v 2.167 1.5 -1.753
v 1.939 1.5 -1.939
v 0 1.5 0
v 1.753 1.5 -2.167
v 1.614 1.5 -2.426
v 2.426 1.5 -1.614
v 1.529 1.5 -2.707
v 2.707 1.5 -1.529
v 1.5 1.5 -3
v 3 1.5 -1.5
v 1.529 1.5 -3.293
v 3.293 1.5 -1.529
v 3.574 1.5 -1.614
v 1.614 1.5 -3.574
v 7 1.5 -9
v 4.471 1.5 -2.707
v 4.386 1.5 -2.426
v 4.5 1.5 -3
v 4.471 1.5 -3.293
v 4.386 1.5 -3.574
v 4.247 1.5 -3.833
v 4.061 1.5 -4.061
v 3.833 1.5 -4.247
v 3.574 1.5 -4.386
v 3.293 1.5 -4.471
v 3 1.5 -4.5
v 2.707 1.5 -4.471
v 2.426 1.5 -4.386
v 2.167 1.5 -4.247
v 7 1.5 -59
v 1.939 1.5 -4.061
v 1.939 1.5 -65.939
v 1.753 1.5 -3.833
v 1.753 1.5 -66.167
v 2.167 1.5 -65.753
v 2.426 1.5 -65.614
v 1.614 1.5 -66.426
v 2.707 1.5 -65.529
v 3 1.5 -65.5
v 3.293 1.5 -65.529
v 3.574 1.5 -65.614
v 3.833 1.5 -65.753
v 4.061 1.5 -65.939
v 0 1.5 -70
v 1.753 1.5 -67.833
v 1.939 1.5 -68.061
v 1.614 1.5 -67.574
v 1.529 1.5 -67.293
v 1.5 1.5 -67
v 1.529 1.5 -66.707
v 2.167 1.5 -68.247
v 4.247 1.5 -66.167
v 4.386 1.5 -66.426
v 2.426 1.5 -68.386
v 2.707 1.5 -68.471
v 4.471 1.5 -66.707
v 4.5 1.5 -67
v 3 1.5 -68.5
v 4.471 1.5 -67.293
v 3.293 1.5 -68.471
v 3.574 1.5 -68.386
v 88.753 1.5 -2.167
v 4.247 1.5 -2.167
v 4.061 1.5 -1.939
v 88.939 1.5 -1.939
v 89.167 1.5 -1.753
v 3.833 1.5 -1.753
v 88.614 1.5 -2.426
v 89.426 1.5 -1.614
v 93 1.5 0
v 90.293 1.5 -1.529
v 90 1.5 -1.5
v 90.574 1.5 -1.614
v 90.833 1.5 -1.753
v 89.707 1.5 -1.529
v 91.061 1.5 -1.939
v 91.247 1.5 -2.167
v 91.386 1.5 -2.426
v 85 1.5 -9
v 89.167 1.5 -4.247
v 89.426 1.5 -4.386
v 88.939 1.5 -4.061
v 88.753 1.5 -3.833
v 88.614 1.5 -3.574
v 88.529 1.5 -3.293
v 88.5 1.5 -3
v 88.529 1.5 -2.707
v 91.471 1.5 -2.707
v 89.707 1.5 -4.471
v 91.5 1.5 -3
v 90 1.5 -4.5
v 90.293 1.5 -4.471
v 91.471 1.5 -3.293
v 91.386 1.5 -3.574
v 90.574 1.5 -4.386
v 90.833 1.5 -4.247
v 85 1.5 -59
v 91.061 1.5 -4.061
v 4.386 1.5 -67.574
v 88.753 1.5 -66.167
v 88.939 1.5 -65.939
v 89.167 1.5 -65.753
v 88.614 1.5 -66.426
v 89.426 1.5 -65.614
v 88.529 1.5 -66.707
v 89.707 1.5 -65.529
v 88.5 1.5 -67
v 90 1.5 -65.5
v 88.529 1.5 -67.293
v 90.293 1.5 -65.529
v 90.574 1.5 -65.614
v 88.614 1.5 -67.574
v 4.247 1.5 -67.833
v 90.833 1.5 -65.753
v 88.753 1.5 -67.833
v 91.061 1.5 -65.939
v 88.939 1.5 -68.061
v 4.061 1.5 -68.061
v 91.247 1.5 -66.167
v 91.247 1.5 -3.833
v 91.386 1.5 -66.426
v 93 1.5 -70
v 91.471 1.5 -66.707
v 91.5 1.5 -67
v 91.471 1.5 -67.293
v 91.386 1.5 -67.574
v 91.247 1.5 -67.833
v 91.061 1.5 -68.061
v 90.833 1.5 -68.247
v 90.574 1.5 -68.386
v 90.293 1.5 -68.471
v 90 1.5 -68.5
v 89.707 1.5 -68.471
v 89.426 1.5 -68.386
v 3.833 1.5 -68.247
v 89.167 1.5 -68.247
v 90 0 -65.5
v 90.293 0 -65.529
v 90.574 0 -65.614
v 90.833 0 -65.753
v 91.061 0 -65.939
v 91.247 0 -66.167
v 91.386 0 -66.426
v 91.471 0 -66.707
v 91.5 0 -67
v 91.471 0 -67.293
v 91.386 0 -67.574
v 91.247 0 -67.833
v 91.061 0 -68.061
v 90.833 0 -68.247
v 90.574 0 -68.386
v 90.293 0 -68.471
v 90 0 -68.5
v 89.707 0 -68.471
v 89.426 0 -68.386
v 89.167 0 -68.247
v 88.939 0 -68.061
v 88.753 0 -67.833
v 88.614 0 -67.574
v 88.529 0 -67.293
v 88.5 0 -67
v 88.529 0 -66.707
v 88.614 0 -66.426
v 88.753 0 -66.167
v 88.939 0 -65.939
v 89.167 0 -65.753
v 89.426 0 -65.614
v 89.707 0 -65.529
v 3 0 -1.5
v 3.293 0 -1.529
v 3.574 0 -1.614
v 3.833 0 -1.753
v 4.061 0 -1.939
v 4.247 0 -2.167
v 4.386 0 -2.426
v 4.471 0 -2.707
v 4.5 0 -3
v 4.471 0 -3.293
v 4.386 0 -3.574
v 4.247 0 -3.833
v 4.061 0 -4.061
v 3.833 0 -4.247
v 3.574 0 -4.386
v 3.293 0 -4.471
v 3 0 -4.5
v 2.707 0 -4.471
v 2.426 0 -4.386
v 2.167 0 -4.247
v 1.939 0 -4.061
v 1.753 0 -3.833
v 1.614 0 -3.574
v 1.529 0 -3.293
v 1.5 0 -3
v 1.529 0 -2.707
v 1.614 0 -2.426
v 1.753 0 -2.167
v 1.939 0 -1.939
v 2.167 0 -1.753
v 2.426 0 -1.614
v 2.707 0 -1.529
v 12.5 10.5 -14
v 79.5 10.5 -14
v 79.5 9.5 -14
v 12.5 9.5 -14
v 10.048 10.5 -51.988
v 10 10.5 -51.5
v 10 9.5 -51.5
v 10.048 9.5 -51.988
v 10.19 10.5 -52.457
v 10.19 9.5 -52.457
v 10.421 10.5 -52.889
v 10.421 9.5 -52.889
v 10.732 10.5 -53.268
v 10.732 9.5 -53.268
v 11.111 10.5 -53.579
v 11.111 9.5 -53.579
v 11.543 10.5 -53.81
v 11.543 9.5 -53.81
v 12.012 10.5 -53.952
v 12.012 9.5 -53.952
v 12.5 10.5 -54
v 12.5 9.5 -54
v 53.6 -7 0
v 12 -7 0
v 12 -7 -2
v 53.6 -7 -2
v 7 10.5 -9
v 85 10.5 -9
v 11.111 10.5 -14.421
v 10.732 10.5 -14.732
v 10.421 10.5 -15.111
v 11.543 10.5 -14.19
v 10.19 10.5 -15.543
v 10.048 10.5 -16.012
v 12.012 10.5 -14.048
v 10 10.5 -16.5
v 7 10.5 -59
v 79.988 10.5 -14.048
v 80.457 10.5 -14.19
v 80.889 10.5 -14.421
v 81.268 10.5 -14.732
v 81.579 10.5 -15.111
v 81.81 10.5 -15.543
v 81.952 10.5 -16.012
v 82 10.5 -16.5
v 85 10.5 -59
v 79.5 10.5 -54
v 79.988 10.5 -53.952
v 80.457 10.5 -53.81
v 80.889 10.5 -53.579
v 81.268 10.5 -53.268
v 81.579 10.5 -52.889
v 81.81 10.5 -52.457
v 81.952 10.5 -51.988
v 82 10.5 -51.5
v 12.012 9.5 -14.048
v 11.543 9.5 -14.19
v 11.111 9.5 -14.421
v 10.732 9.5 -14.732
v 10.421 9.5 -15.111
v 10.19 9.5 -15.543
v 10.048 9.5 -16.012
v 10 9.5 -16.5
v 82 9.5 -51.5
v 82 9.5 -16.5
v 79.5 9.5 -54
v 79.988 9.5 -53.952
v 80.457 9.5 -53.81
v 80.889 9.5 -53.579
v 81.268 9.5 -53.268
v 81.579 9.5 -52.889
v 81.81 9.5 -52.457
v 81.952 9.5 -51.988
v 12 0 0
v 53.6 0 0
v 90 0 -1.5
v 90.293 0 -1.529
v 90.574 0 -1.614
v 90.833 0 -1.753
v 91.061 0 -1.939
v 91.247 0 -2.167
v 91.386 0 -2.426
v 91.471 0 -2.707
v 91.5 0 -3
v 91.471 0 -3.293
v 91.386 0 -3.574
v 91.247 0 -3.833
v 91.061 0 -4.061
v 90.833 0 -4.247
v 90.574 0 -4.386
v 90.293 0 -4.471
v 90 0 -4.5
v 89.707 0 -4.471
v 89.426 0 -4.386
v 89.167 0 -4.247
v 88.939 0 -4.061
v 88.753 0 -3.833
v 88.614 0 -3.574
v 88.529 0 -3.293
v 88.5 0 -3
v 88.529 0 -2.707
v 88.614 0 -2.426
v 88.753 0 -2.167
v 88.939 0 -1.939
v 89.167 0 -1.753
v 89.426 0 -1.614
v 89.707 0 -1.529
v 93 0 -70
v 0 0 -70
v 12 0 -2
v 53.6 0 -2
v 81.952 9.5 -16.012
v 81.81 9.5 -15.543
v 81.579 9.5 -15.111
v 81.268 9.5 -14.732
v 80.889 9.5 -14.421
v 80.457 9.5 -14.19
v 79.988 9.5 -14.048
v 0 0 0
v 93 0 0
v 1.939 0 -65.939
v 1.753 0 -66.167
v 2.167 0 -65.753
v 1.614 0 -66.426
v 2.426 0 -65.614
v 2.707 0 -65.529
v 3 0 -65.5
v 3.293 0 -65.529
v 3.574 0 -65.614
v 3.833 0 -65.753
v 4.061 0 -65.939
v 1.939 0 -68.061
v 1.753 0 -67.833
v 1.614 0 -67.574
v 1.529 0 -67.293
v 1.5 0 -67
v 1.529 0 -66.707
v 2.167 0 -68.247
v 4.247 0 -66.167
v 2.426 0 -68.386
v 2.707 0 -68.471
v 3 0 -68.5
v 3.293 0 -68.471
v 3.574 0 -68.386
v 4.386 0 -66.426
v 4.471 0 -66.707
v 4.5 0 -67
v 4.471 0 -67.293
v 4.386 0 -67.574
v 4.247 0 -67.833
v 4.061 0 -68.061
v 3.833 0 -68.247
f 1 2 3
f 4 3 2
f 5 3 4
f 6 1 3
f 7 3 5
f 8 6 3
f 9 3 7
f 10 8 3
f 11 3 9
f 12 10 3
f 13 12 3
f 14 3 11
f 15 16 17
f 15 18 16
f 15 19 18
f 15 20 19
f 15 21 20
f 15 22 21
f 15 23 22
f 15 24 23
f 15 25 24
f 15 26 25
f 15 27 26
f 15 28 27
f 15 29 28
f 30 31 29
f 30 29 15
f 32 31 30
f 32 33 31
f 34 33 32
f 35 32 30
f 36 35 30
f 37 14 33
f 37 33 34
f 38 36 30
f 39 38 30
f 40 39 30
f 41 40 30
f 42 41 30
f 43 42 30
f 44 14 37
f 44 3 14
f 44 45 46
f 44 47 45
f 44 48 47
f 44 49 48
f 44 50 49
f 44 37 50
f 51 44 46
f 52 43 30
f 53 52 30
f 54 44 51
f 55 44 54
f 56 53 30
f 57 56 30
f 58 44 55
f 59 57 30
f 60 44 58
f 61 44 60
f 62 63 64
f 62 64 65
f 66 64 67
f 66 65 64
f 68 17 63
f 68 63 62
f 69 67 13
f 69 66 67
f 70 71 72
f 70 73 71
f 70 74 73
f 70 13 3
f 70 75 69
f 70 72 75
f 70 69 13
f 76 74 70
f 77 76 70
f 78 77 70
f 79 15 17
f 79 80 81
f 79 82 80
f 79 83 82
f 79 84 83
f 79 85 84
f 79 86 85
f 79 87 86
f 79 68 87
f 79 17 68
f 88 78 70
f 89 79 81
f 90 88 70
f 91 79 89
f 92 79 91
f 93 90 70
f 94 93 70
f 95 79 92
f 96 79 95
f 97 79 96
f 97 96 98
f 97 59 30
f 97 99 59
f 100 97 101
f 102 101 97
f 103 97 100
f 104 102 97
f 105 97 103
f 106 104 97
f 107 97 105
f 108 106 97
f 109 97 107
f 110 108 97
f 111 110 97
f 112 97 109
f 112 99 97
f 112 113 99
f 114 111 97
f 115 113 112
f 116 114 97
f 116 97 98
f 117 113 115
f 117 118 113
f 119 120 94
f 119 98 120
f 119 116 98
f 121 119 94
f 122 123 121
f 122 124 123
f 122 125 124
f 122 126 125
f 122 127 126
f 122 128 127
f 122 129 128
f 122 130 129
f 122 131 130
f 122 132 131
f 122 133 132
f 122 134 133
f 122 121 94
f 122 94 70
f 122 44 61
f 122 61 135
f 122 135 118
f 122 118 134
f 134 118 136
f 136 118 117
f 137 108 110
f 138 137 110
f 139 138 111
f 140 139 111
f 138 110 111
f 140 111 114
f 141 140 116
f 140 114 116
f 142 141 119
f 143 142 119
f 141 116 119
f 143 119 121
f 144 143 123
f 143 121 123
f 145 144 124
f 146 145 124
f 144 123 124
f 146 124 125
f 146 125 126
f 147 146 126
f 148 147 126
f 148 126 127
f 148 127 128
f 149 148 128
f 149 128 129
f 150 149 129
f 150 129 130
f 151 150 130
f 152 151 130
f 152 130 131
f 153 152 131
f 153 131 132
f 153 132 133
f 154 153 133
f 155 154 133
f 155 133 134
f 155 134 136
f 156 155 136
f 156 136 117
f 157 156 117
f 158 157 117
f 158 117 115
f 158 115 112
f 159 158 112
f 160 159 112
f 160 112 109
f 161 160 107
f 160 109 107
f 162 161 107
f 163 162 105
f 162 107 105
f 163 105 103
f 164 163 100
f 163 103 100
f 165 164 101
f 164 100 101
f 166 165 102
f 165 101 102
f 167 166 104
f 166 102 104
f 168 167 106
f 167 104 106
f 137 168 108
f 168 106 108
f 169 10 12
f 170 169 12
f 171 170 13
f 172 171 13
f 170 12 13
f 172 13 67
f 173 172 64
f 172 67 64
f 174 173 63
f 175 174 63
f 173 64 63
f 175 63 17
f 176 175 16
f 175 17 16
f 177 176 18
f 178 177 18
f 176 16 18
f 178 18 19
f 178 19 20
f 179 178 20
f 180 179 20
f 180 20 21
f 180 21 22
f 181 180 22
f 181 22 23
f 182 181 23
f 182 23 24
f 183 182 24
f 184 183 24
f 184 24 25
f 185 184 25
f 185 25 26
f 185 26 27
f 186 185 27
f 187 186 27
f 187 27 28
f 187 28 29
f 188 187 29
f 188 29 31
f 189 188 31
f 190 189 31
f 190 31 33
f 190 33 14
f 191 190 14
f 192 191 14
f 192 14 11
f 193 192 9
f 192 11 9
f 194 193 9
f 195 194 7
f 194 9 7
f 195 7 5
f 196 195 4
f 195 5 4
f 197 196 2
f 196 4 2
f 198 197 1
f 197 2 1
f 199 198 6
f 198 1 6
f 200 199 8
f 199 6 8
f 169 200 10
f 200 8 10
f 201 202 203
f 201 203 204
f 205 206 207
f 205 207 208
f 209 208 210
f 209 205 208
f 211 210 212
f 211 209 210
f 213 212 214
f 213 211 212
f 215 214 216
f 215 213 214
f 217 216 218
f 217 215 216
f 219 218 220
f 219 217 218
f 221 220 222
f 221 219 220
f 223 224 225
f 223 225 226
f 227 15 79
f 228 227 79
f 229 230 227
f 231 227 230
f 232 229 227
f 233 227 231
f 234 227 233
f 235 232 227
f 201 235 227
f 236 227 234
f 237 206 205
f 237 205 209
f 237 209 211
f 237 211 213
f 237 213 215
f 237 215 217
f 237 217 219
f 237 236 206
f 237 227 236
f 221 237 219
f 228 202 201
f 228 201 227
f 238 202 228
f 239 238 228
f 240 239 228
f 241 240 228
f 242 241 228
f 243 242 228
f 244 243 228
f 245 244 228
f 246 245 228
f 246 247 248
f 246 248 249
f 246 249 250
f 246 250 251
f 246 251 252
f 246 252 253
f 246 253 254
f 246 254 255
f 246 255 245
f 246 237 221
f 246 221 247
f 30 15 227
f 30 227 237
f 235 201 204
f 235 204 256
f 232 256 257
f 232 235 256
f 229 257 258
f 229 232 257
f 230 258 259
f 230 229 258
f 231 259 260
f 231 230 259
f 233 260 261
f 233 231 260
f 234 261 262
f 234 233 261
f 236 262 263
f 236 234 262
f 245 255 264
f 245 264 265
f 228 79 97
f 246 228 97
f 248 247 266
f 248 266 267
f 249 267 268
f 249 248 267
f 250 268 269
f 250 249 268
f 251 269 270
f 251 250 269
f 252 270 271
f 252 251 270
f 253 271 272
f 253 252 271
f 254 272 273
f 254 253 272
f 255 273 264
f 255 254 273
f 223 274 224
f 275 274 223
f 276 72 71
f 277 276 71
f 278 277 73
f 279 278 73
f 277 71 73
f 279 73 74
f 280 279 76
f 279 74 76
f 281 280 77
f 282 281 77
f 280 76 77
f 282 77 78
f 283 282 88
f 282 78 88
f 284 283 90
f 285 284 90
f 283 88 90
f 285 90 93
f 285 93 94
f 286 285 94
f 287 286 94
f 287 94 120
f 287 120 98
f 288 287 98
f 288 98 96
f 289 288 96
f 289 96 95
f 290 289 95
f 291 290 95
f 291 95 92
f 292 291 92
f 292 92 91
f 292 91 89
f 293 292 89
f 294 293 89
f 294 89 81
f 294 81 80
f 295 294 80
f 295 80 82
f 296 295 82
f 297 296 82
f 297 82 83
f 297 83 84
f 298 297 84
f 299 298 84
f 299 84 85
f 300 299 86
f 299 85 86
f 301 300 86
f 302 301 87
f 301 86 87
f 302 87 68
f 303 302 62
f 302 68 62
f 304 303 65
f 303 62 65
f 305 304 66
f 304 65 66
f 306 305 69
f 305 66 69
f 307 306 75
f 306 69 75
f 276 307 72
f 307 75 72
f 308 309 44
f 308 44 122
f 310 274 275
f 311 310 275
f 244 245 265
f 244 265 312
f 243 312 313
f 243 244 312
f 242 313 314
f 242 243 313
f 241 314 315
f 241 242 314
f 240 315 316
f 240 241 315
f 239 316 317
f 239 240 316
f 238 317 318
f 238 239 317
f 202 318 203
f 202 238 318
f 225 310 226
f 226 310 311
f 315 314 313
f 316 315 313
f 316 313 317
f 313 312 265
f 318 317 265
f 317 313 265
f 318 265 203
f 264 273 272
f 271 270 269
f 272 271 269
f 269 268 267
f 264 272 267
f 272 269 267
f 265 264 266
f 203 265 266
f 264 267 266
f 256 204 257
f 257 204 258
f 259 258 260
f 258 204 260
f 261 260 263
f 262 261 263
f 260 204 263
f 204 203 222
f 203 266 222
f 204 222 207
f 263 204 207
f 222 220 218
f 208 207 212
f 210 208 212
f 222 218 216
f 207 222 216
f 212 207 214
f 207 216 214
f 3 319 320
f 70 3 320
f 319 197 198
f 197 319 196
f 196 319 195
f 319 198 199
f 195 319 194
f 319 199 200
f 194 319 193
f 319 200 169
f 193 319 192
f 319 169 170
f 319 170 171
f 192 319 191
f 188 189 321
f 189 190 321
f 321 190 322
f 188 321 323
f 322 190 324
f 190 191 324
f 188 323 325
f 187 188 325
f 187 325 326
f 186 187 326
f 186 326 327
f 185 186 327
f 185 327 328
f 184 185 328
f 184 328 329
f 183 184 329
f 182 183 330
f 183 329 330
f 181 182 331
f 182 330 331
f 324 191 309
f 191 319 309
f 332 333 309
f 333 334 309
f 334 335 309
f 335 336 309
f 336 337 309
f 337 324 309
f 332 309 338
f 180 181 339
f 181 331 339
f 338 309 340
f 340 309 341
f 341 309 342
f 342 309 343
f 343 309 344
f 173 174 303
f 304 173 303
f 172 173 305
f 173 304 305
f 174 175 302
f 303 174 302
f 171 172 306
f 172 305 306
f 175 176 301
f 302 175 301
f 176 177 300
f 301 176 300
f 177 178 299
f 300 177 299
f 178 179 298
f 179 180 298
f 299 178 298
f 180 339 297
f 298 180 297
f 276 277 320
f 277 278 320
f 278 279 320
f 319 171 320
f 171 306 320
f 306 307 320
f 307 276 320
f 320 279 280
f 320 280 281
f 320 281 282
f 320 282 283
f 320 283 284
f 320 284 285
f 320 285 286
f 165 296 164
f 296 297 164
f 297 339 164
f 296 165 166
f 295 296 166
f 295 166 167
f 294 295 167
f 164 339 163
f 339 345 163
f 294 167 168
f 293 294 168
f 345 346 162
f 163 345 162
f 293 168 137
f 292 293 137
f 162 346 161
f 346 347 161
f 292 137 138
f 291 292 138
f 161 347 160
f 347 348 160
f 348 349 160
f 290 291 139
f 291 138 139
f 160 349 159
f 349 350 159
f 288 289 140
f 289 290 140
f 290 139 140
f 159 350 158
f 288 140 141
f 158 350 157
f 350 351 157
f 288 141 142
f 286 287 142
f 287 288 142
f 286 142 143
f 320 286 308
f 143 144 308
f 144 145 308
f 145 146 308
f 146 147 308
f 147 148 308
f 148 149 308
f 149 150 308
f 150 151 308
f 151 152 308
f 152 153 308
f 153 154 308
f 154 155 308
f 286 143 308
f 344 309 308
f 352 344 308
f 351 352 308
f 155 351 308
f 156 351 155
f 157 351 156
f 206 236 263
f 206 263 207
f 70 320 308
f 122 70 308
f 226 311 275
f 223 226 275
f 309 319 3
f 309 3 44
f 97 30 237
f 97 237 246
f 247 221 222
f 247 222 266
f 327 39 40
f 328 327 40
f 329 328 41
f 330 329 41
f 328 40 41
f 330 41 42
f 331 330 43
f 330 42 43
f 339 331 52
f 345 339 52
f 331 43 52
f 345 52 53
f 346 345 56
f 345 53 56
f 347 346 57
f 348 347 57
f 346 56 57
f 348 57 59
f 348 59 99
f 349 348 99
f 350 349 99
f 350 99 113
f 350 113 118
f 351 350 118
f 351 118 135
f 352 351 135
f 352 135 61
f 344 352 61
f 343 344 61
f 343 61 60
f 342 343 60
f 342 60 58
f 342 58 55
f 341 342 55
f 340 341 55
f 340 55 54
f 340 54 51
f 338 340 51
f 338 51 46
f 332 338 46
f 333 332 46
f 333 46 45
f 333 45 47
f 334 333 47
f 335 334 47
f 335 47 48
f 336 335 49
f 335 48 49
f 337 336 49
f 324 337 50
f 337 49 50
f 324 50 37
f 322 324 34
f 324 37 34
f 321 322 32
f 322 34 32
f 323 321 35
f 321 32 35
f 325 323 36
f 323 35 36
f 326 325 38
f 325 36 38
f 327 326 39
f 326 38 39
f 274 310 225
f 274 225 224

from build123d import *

# Parameters (mm, degrees)
SKETCH1_W           = 93
SKETCH1_H           = 70
BOSS_EXTRUDE1_DEPTH = 1.5
SKETCH2_W           = 78
SKETCH2_H           = 50
BOSS_EXTRUDE2_DEPTH = 9
CUT_EXTRUDE1_DEPTH  = 1
SKETCH4_R           = 1.5
CUT_EXTRUDE2_DEPTH  = 117.747590982
SKETCH5_W           = 41.6
SKETCH5_H           = 2
BOSS_EXTRUDE3_DEPTH = 7


with BuildPart() as part:
    # Sketch1 → Boss-Extrude1 (new body)
    with BuildSketch(Plane(origin=(0, 0, 0), x_dir=(1, 0, 0), z_dir=(0, 1, 0))):
        with Locations((46.5, 35)):
            Rectangle(SKETCH1_W, SKETCH1_H)
    extrude(amount=BOSS_EXTRUDE1_DEPTH)

    # Sketch2 → Boss-Extrude2 (add)
    with BuildSketch(Plane(origin=(0, 1.5, 0), x_dir=(1, 0, 0), z_dir=(0, 1, 0))):
        with Locations((46, 34)):
            Rectangle(SKETCH2_W, SKETCH2_H)
    extrude(amount=BOSS_EXTRUDE2_DEPTH)

    # Sketch3 → Cut-Extrude1 (cut)
    with BuildSketch(Plane(origin=(0, 10.5, 0), x_dir=(1, 0, 0), z_dir=(0, 1, 0))):
        with BuildLine():
            Line((12.5, 54), (79.5, 54))
            ThreePointArc((79.5, 54), (81.267766953, 53.267766953), (82, 51.5))
            Line((82, 51.5), (82, 16.5))
            ThreePointArc((82, 16.5), (81.267766953, 14.732233047), (79.5, 14))
            Line((79.5, 14), (12.5, 14))
            ThreePointArc((12.5, 14), (10.732233047, 14.732233047), (10, 16.5))
            Line((10, 16.5), (10, 51.5))
            ThreePointArc((10, 51.5), (10.732233047, 53.267766953), (12.5, 54))
        make_face()
    extrude(amount=-CUT_EXTRUDE1_DEPTH, mode=Mode.SUBTRACT)

    # Sketch4 → Cut-Extrude2 (cut, through all)
    with BuildSketch(Plane(origin=(0, 1.5, 0), x_dir=(1, 0, 0), z_dir=(0, 1, 0))):
        with Locations(Location((3, 67, 0), (0, 0, 270))):
            Circle(SKETCH4_R)
        with Locations(Location((90, 67, 0), (0, 0, 270))):
            Circle(SKETCH4_R)
        with Locations(Location((90, 3, 0), (0, 0, 270))):
            Circle(SKETCH4_R)
        with Locations(Location((3, 3, 0), (0, 0, 270))):
            Circle(SKETCH4_R)
    extrude(amount=-CUT_EXTRUDE2_DEPTH, mode=Mode.SUBTRACT)


with BuildPart() as body_2:
    # Sketch5 → Boss-Extrude3 (new body)
    with BuildSketch(Plane.XZ):
        with Locations((32.8, -1)):
            Rectangle(SKETCH5_W, SKETCH5_H)
    extrude(amount=BOSS_EXTRUDE3_DEPTH)


solid = Compound([part.part, body_2.part])
